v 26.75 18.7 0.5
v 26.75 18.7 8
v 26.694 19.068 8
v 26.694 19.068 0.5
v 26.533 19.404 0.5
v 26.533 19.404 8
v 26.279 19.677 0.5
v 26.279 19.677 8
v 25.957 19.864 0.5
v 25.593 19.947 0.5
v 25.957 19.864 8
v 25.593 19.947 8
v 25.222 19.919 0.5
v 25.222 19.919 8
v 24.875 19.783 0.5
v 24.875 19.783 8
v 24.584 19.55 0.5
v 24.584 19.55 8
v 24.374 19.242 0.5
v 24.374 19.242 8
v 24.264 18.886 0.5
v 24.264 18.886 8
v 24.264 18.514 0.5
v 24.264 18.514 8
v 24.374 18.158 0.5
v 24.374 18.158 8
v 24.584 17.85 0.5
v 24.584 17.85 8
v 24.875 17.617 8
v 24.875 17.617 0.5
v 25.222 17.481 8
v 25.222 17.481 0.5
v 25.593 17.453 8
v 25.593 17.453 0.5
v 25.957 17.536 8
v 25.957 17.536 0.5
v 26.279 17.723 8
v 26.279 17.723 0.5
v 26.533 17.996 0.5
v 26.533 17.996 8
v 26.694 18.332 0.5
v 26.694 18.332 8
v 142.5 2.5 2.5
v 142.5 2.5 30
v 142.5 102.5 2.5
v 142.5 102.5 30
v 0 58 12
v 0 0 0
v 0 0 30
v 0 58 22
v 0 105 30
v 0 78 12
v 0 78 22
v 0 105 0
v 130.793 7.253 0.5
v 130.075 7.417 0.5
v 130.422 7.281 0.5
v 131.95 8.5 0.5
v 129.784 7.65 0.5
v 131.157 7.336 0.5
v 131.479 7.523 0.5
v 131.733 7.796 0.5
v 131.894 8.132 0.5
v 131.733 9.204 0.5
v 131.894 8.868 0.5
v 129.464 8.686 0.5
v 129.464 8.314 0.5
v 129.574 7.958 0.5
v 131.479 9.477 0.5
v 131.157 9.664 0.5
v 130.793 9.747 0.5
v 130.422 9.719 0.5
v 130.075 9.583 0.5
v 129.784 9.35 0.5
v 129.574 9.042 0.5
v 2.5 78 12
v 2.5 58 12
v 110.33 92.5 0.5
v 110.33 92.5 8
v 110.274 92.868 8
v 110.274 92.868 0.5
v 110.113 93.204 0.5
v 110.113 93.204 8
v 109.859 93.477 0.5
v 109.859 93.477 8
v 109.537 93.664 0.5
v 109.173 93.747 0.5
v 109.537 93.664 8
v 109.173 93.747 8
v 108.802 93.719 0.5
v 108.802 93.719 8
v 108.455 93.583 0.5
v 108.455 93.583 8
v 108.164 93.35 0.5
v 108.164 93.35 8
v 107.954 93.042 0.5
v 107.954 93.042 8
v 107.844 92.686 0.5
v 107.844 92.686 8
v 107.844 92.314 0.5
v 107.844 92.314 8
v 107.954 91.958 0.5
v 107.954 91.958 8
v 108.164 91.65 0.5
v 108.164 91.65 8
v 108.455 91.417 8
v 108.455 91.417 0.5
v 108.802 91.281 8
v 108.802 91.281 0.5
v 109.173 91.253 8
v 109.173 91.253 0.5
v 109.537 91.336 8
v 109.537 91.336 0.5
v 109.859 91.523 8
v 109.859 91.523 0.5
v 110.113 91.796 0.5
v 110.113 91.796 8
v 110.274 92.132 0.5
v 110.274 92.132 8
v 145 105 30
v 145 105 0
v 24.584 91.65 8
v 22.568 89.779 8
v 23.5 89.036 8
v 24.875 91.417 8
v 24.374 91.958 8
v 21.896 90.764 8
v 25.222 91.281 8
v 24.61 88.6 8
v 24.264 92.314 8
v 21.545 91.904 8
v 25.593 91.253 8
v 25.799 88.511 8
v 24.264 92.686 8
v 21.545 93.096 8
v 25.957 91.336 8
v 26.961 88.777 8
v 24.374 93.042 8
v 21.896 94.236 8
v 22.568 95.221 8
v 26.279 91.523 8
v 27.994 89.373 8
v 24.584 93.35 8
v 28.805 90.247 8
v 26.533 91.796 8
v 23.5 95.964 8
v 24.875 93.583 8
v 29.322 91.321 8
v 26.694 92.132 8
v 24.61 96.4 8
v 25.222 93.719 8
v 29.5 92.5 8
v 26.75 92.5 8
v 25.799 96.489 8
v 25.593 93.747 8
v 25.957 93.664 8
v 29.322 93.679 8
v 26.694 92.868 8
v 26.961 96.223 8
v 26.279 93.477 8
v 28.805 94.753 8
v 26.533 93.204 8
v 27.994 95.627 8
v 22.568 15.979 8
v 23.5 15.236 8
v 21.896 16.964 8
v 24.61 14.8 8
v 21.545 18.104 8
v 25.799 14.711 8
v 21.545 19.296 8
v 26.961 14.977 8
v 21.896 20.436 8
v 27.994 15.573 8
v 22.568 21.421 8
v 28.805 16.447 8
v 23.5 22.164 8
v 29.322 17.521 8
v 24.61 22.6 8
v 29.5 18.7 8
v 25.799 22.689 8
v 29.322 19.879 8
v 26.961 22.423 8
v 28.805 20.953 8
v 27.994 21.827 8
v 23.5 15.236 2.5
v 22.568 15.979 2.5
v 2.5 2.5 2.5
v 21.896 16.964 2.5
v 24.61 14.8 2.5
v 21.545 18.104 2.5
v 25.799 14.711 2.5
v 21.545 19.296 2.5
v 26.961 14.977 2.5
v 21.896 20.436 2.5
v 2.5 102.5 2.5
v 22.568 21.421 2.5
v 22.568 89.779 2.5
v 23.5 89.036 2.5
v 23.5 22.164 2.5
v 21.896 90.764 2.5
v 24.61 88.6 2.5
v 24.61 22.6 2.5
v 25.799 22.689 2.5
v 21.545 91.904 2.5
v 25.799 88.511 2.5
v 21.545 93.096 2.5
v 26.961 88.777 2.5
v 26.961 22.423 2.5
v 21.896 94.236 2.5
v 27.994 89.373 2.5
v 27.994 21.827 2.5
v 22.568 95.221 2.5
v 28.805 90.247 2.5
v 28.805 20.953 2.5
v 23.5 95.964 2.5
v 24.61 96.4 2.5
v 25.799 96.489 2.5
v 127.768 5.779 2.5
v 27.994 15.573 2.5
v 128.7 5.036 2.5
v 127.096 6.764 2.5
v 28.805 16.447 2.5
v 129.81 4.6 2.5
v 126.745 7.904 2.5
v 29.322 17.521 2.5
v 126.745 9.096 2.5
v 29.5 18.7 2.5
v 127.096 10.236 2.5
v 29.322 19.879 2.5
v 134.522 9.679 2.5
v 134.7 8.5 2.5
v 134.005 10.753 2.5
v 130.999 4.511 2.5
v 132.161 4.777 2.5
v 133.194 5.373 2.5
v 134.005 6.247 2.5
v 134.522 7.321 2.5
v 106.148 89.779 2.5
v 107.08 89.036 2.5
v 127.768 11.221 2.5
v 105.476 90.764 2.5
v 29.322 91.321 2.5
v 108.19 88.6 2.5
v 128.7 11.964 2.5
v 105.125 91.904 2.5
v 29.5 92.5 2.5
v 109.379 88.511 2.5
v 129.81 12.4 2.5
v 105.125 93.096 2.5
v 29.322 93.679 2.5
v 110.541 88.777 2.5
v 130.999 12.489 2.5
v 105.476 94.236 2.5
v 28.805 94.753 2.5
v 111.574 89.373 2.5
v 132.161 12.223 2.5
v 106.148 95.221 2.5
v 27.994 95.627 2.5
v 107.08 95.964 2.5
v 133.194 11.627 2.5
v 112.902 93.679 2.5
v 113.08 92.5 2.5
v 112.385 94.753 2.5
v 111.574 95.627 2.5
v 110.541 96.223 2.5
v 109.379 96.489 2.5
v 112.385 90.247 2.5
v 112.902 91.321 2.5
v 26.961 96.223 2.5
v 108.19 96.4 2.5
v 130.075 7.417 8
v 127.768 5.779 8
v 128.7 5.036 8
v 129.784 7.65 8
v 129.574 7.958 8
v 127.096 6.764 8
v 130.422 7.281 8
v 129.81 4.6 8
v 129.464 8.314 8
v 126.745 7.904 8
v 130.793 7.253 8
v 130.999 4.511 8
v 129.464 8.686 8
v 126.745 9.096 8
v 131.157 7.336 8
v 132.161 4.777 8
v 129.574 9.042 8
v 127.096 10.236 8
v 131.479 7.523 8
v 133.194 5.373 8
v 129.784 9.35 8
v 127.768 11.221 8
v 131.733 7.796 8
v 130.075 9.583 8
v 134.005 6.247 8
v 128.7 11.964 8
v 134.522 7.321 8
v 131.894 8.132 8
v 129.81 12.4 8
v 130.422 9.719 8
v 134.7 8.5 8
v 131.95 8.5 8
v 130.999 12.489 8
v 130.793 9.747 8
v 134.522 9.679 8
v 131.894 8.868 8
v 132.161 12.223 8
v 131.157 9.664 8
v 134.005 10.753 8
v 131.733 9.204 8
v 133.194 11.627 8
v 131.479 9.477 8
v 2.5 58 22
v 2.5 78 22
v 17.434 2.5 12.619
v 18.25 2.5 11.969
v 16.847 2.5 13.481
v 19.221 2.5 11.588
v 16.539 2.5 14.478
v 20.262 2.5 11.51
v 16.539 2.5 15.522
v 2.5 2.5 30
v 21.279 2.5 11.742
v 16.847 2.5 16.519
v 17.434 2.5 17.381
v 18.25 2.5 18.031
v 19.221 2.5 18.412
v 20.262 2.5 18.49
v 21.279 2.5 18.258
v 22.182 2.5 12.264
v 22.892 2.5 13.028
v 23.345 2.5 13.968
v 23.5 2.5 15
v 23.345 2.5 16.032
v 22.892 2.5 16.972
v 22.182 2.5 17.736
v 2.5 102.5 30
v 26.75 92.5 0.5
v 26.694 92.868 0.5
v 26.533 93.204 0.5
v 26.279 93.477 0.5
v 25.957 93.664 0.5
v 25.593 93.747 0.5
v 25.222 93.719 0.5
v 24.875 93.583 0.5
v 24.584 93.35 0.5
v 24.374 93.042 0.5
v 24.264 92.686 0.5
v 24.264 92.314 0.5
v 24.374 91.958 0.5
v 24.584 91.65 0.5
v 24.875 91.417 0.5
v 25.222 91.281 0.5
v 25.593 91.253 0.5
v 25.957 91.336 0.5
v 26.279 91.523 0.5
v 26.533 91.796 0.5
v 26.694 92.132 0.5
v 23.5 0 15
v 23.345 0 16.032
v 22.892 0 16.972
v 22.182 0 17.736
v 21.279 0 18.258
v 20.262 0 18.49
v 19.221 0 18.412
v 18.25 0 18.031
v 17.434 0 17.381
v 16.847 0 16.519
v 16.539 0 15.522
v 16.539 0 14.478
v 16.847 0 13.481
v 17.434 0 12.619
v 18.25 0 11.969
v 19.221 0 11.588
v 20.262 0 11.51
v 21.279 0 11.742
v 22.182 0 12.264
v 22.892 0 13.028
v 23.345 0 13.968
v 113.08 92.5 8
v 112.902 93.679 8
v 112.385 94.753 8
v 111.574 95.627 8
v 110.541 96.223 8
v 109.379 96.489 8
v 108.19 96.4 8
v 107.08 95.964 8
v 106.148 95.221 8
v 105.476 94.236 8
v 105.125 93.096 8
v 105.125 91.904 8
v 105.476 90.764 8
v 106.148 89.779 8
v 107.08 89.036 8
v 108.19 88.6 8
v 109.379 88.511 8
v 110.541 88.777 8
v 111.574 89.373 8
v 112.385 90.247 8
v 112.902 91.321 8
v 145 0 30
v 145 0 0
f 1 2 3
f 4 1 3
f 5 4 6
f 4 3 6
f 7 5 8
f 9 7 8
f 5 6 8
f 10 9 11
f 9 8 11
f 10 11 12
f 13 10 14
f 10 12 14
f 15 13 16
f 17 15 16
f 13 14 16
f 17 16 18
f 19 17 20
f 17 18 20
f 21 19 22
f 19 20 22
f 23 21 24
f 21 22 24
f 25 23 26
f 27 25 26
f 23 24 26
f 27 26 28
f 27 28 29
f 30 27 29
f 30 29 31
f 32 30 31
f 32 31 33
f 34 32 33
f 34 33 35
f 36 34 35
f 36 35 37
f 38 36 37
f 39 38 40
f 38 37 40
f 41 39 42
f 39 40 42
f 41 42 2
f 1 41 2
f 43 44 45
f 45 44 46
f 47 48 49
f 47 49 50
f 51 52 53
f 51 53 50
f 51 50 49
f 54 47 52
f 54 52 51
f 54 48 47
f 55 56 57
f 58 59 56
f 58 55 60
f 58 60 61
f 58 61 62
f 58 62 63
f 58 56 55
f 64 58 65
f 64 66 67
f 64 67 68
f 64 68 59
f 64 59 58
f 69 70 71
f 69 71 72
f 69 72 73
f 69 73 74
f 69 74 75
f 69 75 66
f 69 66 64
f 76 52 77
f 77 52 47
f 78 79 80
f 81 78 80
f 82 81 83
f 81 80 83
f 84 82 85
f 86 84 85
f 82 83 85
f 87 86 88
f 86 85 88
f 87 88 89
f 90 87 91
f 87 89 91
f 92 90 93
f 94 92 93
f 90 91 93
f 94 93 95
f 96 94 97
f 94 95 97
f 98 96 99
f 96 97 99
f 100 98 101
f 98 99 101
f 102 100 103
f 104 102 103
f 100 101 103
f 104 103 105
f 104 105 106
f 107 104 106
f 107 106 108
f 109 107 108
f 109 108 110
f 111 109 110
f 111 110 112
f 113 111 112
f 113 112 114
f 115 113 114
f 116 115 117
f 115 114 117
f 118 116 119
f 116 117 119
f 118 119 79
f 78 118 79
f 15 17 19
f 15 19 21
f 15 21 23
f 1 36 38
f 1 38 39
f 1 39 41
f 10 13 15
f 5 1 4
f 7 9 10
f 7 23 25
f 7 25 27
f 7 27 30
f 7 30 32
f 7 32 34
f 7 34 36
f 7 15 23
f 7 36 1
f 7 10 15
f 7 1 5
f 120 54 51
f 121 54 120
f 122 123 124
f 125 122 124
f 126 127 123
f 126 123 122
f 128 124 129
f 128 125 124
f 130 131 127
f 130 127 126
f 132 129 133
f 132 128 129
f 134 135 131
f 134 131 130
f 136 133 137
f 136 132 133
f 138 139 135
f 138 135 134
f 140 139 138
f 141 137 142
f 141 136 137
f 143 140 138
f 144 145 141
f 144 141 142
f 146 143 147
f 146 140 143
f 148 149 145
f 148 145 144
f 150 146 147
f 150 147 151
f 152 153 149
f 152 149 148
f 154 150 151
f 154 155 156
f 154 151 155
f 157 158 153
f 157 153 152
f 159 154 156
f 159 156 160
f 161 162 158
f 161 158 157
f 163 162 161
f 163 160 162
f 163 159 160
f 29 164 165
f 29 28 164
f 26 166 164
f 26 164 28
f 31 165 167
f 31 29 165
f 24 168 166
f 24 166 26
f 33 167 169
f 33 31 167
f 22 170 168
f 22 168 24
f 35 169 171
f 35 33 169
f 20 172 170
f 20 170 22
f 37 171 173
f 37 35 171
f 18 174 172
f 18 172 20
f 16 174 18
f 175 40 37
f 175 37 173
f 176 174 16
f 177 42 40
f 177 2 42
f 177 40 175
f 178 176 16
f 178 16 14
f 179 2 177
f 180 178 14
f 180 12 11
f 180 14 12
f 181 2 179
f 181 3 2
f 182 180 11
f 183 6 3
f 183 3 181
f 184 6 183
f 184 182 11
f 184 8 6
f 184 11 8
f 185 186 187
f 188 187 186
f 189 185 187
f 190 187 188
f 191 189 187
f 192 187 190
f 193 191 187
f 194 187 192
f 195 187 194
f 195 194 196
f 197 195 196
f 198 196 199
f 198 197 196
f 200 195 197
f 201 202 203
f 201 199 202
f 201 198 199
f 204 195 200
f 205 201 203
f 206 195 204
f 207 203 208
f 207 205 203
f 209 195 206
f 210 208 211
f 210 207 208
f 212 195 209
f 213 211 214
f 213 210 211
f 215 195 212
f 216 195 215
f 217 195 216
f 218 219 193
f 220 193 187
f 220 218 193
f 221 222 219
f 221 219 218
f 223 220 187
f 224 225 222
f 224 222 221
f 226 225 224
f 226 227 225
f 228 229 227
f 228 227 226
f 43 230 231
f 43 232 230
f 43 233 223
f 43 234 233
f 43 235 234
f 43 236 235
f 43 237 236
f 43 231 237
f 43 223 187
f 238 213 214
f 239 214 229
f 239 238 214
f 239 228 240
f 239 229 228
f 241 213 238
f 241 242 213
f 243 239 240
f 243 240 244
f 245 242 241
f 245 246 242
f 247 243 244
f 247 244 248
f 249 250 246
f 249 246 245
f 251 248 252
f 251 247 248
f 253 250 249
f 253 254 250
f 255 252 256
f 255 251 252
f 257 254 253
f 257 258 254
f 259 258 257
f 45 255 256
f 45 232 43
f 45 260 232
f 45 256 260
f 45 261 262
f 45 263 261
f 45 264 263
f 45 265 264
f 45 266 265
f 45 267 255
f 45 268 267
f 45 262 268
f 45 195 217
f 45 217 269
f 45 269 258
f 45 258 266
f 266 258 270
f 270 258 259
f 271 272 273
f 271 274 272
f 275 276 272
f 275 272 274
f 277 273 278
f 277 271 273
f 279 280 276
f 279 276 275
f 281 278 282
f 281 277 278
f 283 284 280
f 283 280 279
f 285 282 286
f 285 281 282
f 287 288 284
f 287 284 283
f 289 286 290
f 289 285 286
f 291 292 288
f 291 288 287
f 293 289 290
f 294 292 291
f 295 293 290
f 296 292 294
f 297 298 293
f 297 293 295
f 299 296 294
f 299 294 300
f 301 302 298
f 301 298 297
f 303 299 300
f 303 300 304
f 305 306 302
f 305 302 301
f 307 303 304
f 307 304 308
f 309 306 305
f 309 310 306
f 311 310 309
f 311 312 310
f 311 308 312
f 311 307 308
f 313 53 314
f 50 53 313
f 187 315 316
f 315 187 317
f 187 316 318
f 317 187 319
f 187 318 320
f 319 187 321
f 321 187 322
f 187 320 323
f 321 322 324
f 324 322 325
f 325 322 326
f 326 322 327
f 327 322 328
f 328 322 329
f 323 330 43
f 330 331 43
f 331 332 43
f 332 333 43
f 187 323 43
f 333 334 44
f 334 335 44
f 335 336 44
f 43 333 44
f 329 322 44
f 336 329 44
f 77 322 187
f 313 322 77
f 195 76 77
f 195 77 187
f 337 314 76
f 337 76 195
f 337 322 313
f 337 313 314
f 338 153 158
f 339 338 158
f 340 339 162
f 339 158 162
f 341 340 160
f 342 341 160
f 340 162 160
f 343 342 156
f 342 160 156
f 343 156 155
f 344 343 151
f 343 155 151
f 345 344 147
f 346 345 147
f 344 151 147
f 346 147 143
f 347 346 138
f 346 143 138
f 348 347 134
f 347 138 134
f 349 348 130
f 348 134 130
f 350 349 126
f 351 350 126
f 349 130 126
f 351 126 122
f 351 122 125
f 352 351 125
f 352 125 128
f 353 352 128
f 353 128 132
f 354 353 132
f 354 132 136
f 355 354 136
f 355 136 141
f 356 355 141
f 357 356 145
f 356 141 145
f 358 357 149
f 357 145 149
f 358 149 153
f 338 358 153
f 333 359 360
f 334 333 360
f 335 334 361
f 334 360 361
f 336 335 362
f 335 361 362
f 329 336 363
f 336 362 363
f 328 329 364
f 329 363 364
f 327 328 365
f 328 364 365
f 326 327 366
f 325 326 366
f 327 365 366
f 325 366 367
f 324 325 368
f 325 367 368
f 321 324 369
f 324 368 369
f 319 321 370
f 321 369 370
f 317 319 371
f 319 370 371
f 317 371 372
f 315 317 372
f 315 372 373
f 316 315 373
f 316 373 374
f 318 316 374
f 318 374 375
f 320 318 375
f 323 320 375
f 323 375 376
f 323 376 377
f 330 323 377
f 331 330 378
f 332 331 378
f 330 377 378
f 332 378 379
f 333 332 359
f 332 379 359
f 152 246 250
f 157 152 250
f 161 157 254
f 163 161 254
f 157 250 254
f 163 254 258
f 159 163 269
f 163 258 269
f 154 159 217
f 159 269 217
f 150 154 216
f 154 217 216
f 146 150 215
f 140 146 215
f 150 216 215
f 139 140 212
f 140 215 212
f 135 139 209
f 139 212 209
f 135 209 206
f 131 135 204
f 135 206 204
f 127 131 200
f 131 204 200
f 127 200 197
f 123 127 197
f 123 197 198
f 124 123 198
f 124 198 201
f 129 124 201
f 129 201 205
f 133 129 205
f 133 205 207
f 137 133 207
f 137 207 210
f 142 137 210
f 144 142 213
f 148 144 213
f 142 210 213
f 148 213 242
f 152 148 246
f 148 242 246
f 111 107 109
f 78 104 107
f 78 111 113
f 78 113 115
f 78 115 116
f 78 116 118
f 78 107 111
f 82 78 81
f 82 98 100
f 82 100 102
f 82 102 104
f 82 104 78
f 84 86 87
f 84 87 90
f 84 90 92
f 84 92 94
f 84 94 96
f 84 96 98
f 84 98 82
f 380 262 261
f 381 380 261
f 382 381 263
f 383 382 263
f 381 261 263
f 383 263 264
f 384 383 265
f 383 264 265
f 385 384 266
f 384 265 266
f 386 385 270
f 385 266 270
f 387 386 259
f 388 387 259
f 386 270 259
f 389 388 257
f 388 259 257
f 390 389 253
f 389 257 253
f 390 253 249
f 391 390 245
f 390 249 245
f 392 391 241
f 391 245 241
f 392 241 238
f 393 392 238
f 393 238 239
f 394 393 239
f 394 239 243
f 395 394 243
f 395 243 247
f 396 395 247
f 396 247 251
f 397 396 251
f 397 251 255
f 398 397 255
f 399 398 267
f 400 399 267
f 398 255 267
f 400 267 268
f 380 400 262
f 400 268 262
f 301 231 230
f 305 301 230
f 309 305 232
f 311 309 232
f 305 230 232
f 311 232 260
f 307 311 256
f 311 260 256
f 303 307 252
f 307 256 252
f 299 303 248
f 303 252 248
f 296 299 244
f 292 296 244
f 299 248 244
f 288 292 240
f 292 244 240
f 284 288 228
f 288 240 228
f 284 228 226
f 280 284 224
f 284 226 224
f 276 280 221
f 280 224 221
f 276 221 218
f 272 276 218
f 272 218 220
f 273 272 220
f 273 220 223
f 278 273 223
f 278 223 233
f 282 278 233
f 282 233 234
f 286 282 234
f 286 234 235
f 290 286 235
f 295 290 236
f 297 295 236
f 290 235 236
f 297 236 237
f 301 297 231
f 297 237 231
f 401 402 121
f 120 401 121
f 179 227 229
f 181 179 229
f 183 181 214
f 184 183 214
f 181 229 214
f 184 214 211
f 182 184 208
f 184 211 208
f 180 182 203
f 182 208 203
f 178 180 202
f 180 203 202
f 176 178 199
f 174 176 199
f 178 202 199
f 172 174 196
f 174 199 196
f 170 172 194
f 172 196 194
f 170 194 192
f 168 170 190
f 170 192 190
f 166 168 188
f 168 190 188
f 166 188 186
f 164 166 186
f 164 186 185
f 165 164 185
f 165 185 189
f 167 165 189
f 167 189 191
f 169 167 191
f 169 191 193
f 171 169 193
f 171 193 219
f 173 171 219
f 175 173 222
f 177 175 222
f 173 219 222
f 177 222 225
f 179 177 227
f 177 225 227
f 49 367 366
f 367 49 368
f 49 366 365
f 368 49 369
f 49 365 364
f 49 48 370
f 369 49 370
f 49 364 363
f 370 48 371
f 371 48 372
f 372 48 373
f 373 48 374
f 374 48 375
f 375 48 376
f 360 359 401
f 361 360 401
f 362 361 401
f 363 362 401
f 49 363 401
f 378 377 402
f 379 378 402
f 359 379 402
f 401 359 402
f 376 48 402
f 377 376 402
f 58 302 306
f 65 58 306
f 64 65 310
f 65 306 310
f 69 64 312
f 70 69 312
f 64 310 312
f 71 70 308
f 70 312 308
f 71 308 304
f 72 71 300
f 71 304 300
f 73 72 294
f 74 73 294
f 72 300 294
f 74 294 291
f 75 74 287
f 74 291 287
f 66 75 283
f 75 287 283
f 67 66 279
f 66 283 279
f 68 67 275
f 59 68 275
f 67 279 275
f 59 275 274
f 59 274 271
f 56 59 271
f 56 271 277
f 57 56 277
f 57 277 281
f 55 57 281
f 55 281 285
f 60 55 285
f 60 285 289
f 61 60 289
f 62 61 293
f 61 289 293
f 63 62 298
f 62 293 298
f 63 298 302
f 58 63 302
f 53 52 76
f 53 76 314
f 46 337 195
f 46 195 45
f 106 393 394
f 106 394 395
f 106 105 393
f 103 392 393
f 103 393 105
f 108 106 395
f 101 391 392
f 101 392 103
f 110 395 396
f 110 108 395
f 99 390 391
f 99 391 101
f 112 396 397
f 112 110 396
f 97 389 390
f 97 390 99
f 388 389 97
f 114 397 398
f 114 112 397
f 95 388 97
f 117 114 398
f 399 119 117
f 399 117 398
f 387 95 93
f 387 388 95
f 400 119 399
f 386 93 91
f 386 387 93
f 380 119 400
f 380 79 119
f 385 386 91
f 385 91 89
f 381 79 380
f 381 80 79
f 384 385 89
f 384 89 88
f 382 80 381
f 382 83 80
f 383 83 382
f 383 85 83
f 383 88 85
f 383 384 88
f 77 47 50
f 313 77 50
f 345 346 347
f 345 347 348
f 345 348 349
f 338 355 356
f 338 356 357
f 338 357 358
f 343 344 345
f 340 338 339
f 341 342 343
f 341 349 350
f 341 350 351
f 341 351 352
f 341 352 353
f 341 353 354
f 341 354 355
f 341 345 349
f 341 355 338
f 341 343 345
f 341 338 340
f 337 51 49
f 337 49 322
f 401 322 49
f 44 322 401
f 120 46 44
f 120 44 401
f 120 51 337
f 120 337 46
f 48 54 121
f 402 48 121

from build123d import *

# Parameters (mm, degrees)
SKETCH_W        = 145
SKETCH_H        = 105
PAD_DEPTH       = 30
SKETCH002_W     = 140
SKETCH002_H     = 100
POCKET_DEPTH    = 27.5
SKETCH003_R     = 4
SKETCH003_R_2   = 1
PAD001_DEPTH    = 5.5
SKETCH004_W     = 20
SKETCH004_H     = 10
POCKET001_DEPTH = 2.5
SKETCH005_R     = 3.5
POCKET002_DEPTH = 2.5
SKETCH006_R     = 1.25
POCKET003_DEPTH = 7.5


with BuildPart() as part:
    # Sketch → Pad (new body)
    with BuildSketch(Plane.XY):
        with Locations((72.5, 52.5)):
            Rectangle(SKETCH_W, SKETCH_H)
    extrude(amount=PAD_DEPTH)

    # Sketch002 (on Face6 of Pad) → Pocket (cut)
    with BuildSketch(Plane.XY.offset(30)):
        with Locations((72.5, 52.5)):
            Rectangle(SKETCH002_W, SKETCH002_H)
    extrude(amount=-POCKET_DEPTH, mode=Mode.SUBTRACT)

    # Sketch003 (on Face11 of Pocket) → Pad001 (join)
    with BuildSketch(Plane.XY.offset(2.5)):
        with Locations((25.5, 92.5)):
            Circle(SKETCH003_R)
        with Locations((25.5, 92.5)):
            Circle(SKETCH003_R_2, mode=Mode.SUBTRACT)
        with Locations((109.08, 92.5)):
            Circle(SKETCH003_R)
        with Locations((109.08, 92.5)):
            Circle(SKETCH003_R_2, mode=Mode.SUBTRACT)
        with Locations((25.5, 18.7)):
            Circle(SKETCH003_R)
        with Locations((25.5, 18.7)):
            Circle(SKETCH003_R_2, mode=Mode.SUBTRACT)
        with Locations((130.7, 8.5)):
            Circle(SKETCH003_R)
        with Locations((130.7, 8.5)):
            Circle(SKETCH003_R_2, mode=Mode.SUBTRACT)
    extrude(amount=PAD001_DEPTH)

    # Sketch004 (on Face2 of Pad001) → Pocket001 (cut)
    with BuildSketch(Plane(origin=(0, 0, 0), x_dir=(0, -1, 0), z_dir=(-1, 0, 0))):
        with Locations((-68, 17)):
            Rectangle(SKETCH004_W, SKETCH004_H)
    extrude(amount=-POCKET001_DEPTH, mode=Mode.SUBTRACT)

    # Sketch005 (on Face1 of Pocket001) → Pocket002 (cut)
    with BuildSketch(Plane.XZ):
        with Locations((20, 15)):
            Circle(SKETCH005_R)
    extrude(amount=-POCKET002_DEPTH, mode=Mode.SUBTRACT)

    # Sketch006 (on Face21 of Pocket002) → Pocket003 (cut)
    with BuildSketch(Plane.XY.offset(8)):
        with Locations((25.5, 92.5)):
            Circle(SKETCH006_R)
        with Locations((109.08, 92.5)):
            Circle(SKETCH006_R)
        with Locations((25.5, 18.7)):
            Circle(SKETCH006_R)
        with Locations((130.7, 8.5)):
            Circle(SKETCH006_R)
    extrude(amount=-POCKET003_DEPTH, mode=Mode.SUBTRACT)


solid = part.part
